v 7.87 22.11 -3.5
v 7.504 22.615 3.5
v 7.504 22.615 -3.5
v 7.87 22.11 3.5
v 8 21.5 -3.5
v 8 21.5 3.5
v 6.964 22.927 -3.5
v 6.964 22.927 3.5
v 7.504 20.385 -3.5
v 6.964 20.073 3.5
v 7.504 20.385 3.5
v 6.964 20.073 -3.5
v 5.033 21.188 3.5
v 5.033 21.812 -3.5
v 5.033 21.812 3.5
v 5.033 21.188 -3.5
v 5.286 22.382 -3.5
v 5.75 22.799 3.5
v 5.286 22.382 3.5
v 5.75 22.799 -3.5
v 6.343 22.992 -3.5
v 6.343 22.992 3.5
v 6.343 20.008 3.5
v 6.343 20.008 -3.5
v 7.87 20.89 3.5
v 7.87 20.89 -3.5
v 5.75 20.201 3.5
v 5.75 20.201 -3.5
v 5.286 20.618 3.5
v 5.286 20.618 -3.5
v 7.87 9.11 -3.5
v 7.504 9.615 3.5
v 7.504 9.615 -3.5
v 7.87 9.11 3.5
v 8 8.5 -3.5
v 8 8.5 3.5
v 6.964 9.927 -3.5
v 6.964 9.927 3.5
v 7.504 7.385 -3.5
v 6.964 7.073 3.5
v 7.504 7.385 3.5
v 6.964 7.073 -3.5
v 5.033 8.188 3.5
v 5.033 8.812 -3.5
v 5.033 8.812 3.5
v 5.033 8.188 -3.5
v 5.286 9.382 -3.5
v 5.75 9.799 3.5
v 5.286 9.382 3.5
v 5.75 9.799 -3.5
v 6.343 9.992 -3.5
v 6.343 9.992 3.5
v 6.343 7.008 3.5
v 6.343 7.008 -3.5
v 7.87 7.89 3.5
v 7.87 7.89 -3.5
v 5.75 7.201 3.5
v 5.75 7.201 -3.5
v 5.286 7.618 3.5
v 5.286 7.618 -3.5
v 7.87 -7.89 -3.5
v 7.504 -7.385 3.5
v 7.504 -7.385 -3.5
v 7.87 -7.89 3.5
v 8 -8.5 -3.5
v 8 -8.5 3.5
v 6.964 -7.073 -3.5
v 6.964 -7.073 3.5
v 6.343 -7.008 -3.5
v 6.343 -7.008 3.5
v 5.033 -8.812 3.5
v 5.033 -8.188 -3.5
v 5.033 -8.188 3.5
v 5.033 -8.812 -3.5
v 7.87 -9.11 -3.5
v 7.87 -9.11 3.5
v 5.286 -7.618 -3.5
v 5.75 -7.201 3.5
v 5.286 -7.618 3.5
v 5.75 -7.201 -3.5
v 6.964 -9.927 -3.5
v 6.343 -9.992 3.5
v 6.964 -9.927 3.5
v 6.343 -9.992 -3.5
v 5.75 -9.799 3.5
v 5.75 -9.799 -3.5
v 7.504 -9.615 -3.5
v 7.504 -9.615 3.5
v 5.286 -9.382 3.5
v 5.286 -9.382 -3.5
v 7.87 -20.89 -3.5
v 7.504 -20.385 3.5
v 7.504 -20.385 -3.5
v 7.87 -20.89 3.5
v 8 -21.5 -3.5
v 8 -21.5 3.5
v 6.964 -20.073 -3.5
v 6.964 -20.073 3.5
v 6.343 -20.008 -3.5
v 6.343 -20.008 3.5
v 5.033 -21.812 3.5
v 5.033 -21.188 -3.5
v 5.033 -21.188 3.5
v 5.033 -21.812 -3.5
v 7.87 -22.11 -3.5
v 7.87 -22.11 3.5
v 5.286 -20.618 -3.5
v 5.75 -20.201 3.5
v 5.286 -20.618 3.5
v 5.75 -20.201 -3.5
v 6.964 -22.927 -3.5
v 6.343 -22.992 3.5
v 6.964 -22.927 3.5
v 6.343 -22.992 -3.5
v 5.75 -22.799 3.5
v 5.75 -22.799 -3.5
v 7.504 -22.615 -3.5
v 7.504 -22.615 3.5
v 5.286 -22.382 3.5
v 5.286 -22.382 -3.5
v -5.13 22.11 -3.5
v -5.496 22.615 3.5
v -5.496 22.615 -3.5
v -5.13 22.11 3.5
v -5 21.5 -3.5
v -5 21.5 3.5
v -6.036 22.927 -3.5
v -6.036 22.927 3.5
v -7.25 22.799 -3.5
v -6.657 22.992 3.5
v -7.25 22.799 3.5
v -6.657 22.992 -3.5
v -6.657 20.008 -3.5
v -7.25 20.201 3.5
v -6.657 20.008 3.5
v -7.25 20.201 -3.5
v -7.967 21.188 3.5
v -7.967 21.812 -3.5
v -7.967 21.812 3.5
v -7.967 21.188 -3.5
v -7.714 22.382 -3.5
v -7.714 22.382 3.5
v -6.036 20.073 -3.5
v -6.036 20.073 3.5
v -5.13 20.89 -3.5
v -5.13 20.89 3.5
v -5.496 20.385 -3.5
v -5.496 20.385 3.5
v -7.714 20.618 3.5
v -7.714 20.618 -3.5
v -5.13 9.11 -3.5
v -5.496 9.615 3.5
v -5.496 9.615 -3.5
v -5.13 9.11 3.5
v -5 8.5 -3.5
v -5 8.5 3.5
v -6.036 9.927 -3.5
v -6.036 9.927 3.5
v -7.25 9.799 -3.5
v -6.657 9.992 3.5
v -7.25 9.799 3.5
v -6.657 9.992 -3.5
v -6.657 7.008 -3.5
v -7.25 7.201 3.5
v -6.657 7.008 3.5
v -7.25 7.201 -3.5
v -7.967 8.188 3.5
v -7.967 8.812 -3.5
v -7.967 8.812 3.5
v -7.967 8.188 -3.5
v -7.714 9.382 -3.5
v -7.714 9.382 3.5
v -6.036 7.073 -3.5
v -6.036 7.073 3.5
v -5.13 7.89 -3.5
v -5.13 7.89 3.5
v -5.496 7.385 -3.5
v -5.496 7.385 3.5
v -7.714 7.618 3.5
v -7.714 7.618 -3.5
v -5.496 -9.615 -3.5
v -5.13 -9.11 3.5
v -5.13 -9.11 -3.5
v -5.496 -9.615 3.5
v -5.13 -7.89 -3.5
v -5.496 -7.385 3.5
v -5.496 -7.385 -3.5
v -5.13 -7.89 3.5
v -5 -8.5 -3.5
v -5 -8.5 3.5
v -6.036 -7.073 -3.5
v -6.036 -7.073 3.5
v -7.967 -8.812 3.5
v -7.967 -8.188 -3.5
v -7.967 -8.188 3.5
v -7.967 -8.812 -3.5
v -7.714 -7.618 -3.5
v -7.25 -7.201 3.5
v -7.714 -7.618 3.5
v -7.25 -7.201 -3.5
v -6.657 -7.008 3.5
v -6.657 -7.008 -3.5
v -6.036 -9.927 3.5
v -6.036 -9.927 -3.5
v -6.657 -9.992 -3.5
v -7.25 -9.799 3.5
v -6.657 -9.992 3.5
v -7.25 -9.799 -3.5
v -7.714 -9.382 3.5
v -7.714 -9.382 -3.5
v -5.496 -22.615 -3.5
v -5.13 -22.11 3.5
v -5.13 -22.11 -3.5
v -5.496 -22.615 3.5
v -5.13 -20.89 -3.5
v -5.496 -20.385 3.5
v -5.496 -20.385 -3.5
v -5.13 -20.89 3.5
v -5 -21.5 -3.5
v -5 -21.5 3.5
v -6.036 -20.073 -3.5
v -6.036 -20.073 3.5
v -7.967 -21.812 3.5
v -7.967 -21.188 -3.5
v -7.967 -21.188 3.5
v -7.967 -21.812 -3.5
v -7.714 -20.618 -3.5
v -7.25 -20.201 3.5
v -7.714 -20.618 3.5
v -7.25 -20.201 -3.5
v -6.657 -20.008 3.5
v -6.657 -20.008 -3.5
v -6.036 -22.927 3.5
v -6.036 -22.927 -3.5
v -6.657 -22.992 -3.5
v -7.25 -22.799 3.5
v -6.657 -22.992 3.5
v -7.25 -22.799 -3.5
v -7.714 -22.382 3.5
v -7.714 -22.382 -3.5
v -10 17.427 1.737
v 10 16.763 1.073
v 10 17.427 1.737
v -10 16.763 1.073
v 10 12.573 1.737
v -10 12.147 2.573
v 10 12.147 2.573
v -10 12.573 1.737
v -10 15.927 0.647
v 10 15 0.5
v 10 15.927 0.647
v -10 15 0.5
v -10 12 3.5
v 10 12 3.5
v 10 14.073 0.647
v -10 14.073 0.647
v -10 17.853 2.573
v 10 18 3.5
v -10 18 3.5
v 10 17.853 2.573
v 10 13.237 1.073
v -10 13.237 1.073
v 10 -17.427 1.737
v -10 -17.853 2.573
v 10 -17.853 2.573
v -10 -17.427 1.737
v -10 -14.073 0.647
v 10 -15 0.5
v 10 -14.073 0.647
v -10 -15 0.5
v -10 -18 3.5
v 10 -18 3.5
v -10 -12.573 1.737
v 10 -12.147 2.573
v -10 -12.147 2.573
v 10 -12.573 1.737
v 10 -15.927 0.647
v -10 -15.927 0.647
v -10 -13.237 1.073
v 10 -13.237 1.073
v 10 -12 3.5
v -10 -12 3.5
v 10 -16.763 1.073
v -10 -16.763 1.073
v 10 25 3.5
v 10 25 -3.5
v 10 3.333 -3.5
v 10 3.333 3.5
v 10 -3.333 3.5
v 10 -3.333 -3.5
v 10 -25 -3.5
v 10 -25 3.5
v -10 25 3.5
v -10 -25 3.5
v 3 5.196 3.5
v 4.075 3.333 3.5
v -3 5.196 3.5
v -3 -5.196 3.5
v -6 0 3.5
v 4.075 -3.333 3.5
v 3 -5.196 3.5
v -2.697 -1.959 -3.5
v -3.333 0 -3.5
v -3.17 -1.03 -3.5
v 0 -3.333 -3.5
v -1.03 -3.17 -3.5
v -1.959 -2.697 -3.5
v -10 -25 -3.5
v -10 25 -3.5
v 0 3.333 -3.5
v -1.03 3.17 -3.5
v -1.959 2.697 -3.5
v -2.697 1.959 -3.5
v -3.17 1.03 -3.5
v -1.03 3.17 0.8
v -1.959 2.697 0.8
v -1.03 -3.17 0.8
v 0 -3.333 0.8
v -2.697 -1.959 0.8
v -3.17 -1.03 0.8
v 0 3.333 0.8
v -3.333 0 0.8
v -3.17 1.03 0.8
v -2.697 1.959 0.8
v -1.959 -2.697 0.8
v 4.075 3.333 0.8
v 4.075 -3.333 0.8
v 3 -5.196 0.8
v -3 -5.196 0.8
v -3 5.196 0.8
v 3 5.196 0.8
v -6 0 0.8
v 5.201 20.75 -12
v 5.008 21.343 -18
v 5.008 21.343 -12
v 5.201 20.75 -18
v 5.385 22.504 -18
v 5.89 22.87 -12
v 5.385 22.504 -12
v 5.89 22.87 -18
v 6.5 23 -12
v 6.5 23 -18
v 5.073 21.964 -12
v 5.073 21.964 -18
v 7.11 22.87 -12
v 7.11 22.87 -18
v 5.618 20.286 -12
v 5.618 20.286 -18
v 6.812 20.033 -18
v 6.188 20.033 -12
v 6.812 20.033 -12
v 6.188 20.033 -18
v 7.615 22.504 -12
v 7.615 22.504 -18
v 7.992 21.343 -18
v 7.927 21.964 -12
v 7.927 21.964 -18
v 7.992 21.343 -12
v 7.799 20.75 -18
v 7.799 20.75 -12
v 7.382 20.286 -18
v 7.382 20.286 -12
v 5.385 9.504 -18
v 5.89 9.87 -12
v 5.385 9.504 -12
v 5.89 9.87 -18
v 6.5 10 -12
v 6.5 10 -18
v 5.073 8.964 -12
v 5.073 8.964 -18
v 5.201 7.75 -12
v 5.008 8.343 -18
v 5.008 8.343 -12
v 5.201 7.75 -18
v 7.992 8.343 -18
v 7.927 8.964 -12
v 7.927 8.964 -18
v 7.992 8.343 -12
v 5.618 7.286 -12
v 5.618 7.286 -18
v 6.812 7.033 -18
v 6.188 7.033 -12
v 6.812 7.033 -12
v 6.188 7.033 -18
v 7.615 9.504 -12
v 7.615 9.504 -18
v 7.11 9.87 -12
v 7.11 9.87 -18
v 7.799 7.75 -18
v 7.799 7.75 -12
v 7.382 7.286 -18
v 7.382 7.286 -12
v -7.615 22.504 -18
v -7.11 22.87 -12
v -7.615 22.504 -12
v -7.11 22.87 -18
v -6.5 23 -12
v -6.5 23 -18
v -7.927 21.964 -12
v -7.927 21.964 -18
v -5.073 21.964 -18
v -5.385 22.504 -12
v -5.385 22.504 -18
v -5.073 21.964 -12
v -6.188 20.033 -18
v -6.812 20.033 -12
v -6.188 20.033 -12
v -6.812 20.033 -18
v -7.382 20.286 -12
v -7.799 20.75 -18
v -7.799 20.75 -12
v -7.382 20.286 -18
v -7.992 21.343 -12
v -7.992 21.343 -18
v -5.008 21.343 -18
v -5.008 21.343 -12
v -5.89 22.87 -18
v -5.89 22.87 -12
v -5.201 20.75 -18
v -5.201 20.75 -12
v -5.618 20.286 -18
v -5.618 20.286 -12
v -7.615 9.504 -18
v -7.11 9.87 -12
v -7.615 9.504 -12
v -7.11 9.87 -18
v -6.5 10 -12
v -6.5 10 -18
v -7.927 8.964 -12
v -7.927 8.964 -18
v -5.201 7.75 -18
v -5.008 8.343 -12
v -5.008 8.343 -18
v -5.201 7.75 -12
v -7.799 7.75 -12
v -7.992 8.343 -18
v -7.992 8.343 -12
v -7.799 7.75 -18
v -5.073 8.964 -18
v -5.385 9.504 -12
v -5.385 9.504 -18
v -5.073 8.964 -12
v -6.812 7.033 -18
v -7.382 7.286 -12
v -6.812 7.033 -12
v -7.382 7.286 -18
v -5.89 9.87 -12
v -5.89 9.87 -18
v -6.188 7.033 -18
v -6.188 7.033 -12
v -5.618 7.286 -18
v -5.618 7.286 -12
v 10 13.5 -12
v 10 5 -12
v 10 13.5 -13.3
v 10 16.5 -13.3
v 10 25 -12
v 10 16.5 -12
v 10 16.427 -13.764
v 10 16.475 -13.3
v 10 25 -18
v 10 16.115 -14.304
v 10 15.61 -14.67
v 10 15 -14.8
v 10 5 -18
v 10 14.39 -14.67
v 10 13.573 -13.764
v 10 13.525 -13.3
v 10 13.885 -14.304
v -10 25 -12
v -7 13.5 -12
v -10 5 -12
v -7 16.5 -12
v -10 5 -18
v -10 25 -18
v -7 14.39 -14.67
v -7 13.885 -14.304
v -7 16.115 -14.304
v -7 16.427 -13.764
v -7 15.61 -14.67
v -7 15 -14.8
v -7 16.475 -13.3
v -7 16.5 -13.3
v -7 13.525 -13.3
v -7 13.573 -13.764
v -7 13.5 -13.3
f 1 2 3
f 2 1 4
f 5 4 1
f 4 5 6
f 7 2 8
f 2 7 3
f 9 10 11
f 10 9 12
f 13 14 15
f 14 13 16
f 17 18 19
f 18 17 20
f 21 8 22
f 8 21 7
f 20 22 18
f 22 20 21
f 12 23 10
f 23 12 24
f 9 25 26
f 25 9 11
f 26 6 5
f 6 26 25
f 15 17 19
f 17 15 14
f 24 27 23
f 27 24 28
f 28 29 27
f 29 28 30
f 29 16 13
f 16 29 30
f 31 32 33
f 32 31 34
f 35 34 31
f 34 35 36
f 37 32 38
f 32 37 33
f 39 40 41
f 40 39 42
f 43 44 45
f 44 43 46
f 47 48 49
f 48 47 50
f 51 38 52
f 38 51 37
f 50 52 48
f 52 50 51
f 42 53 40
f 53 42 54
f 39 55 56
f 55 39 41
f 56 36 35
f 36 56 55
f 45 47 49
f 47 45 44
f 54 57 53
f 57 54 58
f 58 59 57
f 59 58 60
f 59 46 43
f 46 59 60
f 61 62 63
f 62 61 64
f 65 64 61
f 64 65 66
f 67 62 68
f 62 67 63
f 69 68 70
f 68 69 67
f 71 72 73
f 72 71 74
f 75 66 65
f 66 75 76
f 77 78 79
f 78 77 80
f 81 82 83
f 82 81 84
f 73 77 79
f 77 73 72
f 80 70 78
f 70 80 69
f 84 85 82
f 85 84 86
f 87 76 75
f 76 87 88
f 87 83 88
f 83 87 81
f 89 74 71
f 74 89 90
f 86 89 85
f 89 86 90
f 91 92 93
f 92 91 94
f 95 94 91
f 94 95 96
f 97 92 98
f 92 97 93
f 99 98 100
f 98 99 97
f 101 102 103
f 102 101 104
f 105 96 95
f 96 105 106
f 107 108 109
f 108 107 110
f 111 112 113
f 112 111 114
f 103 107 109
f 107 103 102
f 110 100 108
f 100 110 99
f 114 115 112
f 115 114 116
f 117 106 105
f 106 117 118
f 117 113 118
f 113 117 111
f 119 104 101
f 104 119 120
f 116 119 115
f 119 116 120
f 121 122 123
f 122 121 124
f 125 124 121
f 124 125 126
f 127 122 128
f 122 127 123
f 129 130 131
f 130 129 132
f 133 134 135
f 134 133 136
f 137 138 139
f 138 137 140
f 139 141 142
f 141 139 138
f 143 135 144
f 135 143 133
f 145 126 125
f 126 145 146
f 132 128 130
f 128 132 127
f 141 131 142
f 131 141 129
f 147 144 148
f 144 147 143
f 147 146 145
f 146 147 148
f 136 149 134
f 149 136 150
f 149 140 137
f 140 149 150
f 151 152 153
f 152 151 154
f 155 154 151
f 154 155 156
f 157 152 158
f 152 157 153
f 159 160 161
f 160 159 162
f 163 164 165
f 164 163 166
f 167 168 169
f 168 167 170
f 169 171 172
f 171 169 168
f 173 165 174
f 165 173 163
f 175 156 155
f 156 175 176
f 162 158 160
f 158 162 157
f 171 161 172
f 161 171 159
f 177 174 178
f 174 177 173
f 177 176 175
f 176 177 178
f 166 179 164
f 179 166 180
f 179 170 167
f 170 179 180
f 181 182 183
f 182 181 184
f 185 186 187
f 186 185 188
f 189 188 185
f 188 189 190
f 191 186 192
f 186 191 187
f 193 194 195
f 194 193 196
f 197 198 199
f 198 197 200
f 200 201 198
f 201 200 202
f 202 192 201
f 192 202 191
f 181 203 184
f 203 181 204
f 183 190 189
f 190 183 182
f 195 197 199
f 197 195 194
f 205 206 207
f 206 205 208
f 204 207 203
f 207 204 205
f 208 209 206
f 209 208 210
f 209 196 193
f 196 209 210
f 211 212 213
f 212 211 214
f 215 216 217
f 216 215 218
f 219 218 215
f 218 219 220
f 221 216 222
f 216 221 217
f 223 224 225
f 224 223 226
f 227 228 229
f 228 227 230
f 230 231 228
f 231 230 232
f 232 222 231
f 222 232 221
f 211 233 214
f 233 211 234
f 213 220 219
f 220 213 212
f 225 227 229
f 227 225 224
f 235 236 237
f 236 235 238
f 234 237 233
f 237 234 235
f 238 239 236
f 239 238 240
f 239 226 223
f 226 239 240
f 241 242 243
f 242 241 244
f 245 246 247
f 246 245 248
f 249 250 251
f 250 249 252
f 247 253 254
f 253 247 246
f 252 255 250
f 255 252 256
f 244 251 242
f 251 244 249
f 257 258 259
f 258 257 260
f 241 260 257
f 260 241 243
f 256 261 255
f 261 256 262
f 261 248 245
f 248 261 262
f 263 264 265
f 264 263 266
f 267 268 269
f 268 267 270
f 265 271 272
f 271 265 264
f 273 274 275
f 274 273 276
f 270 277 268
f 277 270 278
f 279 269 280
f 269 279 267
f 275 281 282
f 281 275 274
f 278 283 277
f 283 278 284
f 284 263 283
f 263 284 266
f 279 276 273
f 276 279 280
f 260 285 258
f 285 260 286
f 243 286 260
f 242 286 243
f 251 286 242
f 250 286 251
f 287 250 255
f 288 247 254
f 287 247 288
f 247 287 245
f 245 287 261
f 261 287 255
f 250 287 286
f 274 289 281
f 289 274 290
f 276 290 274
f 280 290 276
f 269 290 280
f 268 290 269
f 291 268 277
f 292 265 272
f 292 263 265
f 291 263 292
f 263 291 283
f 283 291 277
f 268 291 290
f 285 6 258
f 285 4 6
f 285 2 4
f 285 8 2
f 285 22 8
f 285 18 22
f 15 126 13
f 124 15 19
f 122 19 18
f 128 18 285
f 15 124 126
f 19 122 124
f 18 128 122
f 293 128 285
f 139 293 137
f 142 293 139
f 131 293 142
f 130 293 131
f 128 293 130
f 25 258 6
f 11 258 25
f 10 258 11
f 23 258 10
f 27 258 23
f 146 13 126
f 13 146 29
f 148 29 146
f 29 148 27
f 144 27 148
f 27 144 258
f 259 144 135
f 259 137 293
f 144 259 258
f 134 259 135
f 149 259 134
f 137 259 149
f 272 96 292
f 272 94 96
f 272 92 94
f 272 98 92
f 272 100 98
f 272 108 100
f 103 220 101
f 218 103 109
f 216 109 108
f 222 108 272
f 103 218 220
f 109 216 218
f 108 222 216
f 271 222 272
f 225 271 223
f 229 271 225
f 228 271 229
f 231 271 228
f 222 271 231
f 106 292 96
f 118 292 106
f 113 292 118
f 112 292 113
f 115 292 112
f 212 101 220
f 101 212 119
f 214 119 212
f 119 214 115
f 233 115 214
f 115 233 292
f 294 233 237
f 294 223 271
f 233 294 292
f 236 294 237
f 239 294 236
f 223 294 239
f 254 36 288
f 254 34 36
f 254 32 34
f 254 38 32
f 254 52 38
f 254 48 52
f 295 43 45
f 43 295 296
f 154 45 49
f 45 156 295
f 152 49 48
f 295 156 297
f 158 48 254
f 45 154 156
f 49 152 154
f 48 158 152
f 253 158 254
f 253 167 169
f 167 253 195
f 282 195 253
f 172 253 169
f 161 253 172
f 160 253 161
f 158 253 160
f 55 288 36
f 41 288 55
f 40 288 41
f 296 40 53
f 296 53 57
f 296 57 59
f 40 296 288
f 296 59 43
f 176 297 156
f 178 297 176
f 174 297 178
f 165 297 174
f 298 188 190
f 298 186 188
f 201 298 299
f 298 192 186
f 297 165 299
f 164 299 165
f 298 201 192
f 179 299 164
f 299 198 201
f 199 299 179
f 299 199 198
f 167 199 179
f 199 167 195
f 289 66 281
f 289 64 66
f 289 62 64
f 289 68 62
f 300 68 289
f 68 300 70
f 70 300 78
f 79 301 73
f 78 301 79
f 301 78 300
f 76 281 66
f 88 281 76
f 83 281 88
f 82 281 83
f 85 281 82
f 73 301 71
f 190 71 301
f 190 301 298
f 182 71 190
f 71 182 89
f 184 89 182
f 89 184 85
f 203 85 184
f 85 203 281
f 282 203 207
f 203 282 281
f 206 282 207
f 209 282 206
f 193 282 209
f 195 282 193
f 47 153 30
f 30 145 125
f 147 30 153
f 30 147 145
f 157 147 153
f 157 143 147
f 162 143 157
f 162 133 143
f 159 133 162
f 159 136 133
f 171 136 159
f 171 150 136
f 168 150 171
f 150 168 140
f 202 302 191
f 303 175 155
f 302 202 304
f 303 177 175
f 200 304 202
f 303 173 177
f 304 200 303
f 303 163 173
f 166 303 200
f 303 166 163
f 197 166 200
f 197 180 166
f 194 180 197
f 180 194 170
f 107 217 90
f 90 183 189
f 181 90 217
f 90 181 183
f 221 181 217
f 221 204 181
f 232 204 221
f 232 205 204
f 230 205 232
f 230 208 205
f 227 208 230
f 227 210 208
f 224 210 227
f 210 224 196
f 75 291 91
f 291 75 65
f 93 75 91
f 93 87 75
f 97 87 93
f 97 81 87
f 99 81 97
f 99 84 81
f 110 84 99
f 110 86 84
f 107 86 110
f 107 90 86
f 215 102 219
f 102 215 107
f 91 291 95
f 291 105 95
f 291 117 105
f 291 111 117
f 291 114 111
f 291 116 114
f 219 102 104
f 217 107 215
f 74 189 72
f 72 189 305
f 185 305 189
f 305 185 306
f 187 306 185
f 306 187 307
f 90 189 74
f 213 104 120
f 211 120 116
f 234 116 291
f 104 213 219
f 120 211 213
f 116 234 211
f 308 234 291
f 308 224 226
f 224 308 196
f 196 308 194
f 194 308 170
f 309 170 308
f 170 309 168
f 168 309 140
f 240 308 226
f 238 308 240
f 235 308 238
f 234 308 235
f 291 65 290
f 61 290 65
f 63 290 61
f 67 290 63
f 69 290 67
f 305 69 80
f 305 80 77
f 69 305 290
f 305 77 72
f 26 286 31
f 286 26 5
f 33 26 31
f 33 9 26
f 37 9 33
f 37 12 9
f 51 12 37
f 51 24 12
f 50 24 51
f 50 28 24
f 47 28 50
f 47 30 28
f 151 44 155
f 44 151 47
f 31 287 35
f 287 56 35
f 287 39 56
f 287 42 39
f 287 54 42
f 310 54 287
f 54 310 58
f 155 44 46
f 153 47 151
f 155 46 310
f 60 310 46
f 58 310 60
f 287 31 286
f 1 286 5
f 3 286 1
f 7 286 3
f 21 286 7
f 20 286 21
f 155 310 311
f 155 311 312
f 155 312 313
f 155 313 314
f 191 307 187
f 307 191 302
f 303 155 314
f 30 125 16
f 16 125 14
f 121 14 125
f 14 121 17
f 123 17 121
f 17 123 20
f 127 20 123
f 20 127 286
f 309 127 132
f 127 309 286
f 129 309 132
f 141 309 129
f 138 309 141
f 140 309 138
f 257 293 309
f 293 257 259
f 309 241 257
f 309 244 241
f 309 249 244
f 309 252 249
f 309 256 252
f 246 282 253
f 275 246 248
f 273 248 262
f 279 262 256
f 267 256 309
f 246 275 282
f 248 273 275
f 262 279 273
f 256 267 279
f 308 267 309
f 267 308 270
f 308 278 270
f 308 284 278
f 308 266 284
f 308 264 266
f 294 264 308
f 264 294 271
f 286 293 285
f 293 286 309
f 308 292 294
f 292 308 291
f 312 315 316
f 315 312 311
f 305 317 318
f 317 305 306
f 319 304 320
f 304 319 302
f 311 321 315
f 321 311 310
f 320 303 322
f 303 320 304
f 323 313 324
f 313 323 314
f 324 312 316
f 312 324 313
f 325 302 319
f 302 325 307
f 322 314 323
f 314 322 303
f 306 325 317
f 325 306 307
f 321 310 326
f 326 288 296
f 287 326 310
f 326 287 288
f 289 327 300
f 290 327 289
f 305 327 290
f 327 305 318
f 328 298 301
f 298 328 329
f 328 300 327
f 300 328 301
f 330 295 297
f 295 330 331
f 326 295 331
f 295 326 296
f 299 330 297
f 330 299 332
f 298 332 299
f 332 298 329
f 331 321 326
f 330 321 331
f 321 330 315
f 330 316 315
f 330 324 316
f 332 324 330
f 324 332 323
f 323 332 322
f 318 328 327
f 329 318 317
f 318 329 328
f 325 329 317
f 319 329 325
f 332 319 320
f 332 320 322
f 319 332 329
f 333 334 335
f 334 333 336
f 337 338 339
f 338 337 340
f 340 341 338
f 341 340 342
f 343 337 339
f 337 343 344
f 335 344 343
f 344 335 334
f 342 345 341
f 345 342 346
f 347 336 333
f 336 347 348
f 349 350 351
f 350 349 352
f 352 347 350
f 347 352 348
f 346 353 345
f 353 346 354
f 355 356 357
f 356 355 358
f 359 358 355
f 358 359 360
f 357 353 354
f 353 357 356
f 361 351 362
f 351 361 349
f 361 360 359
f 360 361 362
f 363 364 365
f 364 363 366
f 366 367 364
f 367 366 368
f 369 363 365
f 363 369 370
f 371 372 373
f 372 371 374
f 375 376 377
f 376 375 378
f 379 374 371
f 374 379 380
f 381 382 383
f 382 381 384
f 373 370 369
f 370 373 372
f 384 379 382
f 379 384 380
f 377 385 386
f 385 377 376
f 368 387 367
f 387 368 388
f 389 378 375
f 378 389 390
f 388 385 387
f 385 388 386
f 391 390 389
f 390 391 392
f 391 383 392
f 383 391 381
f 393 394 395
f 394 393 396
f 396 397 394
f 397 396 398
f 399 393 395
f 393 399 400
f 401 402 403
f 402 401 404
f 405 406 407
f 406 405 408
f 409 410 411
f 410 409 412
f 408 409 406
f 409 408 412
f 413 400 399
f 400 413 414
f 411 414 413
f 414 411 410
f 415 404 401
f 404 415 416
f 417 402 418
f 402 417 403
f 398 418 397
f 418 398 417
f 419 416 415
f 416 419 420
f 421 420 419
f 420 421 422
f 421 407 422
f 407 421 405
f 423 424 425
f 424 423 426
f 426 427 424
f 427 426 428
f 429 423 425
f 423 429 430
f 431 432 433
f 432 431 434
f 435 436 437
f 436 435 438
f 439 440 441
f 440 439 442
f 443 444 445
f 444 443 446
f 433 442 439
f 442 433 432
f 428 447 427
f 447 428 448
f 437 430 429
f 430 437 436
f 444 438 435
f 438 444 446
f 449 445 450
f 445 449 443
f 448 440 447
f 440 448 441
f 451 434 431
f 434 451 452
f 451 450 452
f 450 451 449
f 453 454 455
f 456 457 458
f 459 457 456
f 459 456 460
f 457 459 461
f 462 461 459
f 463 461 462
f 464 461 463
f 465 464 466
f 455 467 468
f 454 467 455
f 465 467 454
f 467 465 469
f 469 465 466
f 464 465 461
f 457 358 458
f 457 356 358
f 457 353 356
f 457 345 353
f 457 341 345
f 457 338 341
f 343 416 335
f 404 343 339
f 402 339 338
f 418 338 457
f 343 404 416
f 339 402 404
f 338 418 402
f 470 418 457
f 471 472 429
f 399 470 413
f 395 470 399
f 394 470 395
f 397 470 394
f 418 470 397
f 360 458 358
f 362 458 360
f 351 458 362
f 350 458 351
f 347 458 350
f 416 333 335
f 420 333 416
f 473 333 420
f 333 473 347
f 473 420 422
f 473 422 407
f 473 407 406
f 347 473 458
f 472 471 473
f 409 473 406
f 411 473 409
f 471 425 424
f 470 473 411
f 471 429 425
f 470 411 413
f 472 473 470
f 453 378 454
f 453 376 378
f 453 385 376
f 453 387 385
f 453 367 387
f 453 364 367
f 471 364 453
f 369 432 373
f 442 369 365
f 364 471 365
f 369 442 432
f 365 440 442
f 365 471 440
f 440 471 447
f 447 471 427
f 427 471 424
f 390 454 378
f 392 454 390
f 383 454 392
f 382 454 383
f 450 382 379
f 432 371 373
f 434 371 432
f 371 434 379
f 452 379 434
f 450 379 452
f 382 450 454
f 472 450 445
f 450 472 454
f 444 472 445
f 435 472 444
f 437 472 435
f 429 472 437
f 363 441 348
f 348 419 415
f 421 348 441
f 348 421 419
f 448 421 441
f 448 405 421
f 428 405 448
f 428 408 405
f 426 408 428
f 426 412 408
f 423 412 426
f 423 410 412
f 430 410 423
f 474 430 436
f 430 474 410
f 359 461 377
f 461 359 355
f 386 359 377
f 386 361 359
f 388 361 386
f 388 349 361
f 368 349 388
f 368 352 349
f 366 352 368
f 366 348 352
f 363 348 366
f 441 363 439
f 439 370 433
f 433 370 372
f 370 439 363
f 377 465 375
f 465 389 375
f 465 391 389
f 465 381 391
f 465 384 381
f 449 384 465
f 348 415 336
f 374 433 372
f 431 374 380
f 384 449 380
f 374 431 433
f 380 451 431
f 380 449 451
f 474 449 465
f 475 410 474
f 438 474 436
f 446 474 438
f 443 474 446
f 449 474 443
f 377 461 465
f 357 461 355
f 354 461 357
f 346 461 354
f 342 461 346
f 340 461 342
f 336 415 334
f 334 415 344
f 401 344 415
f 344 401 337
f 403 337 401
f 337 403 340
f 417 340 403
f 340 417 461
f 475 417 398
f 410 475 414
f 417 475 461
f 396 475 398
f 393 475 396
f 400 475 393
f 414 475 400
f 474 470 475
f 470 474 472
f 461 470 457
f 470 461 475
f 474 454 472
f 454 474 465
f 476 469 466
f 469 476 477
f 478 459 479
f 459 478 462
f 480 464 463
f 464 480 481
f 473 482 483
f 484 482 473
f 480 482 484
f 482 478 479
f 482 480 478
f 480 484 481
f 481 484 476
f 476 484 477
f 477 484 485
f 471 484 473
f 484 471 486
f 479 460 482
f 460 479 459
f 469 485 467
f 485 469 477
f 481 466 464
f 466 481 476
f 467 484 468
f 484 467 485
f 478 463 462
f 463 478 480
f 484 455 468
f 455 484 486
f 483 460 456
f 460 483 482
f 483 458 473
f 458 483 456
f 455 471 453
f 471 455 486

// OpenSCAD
// file: parameters.scad
// Parameters file for RepRap Huxley (and maybe Mendel)

// Set ONE OF these true.

huxley=true;
mendel=!huxley;



pi=3.14159265;

// The relative location in your file system where the .dxf files are
// DXFs are for quick development.  They should be replaced by parameterised CSG in due course.

fileroot="Design-drawings/";

rodsize = 6;	//threaded/smooth rod diameter in mm
xaxis = 182.5;	//width of base in mm
yaxis = 266.5;	//length of base in mm


screwsize = 3;	//bearing bore/screw diameter in mm
bearingsize = 10;	//outer diameter of bearings in mm
bearingwidth = 4;	//width of bearings in mm


rodpitch = rodsize / 6;
rodnutsize = 0.8 * rodsize;
rodnutdiameter = 1.9 * rodsize;
rodwashersize = 0.2 * rodsize;
rodwasherdiameter = 2 * rodsize;
screwpitch = screwsize / 6;
nutsize = 0.8 * screwsize;
nutdiameter = 1.9 * screwsize;
pentanutradius=1.04*screwsize;
washersize = 0.2 * screwsize;
washerdiameter = 2 * screwsize;
partthick = 2 * rodsize;
vertexrodspace = 2 * rodsize;


c = [0.3, 0.3, 0.3];
rodendoffset = rodnutsize + rodwashersize * 2 + partthick / 2;
vertexoffset = vertexrodspace + rodendoffset;


renderrodthreads = false;
renderscrewthreads = false;
fn = 36;

// The gap between the joining rods at a vertex

vertex_radius=sqrt(rodsize*rodsize + vertexoffset*vertexoffset);
vertex_ang = atan(vertexoffset/rodsize)-30;
vertex_gap = 2*vertex_radius*cos(vertex_ang);

// Nema 17 dimensions - these are absolute

nema17_square=42;
nema17_screws=31;
nema17_screw_r=1.5;
nema17_hub=22;
nema17_hub_depth=2;
nema17_length=36;
nema17_shaft=5;
nema17_shaft_length=55;
nema17_shaft_projection=22;

// Nema 14 dimensions - these are absolute

nema14_square=35.3;
nema14_screws=26;
nema14_screw_r=1.5;
nema14_hub=22;
nema14_hub_depth=2;
nema14_length=36;
nema14_shaft=5;
nema14_shaft_length=66;
nema14_shaft_projection=19;

// Nema 11 dimensions - these are absolute

nema11_square=28.5;
nema11_screws=23;
nema11_screw_r=1.25;
nema11_hub=22;
nema11_hub_depth=2;
nema11_length=44.5;
nema11_shaft=5;
nema11_shaft_length=78;
nema11_shaft_projection=18;

// Limit switch parameters

limit_switch_hole_diameter=2.5;
limit_switch_centres=9.5;

// The RepRap slide bearings

bearing_mount_centres=18;
bearing_width=7;
bearing_depth=18;

// X axis parameters - many should be relative

x_bar_gap=30;
motor_center_y = 26;
bar_clamp_x=5;
bar_clamp_y=8;
bar_clamp_x_gap=23;
bearing_y=50;
bearing_x=bar_clamp_x_gap + 10;
hole_land=4;
thickness=5;
bearing_low_z = 8;
bearing_z_gap = 25;
bearing_plate_width = bearing_mount_centres+2*hole_land + 10;
bearing_plate_overlap=0.5;
bearing_plate_support=10;
// main file
include <parameters.scad>;
use <library.scad>;

clamp_holes=13;

module x_axis_z_nut_holder()
{
	difference()
	{
		cube([20,50,7], center=true);
		cylinder(r=rodsize/1.8, h= rodsize*10, center=true, $fn=20);
		translate([10,0,0])
			cube([20,2*rodsize/1.8,30], center=true);

		for(a = [1, -1])
		{
			translate([0,a*x_bar_gap/2,7/2])
				rotate([0,90,0])
					cylinder(r=rodsize/2, h= rodsize*10, center=true, $fn=20);

			for(b = [1, -1])
			for(c = [1, -1])
			translate([a*clamp_holes/2,b*x_bar_gap/2+c*clamp_holes/2,0])
					cylinder(r=screwsize/2, h= rodsize*10, center=true, $fn=15);
		}
		translate([0,0,7/2-0.2])
			cylinder(r=rodsize, h= 5, center=true, $fn=6);
	}
}


module x_cable_support_clamp()
{

	difference()
	{
		cube([20,20,6],center=true);

		for(a = [1, -1])
		{

			for(b = [1, -1])
			translate([a*clamp_holes/2,b*clamp_holes/2,-5*rodsize])
					rotate([0,0,90])
						cylinder(r=screwsize/2, h= rodsize*20, center=true, $fn=15);
		}

		translate([3,0,1.7])
		rotate([0,90,0])
			cylinder(r=1.5, h= 20, center=true, $fn=15);
		translate([3,0,4.7])
			cube([20, 3, 6], center=true);

	}

}

x_axis_z_nut_holder();

translate([0,15,-15])
	x_cable_support_clamp();
